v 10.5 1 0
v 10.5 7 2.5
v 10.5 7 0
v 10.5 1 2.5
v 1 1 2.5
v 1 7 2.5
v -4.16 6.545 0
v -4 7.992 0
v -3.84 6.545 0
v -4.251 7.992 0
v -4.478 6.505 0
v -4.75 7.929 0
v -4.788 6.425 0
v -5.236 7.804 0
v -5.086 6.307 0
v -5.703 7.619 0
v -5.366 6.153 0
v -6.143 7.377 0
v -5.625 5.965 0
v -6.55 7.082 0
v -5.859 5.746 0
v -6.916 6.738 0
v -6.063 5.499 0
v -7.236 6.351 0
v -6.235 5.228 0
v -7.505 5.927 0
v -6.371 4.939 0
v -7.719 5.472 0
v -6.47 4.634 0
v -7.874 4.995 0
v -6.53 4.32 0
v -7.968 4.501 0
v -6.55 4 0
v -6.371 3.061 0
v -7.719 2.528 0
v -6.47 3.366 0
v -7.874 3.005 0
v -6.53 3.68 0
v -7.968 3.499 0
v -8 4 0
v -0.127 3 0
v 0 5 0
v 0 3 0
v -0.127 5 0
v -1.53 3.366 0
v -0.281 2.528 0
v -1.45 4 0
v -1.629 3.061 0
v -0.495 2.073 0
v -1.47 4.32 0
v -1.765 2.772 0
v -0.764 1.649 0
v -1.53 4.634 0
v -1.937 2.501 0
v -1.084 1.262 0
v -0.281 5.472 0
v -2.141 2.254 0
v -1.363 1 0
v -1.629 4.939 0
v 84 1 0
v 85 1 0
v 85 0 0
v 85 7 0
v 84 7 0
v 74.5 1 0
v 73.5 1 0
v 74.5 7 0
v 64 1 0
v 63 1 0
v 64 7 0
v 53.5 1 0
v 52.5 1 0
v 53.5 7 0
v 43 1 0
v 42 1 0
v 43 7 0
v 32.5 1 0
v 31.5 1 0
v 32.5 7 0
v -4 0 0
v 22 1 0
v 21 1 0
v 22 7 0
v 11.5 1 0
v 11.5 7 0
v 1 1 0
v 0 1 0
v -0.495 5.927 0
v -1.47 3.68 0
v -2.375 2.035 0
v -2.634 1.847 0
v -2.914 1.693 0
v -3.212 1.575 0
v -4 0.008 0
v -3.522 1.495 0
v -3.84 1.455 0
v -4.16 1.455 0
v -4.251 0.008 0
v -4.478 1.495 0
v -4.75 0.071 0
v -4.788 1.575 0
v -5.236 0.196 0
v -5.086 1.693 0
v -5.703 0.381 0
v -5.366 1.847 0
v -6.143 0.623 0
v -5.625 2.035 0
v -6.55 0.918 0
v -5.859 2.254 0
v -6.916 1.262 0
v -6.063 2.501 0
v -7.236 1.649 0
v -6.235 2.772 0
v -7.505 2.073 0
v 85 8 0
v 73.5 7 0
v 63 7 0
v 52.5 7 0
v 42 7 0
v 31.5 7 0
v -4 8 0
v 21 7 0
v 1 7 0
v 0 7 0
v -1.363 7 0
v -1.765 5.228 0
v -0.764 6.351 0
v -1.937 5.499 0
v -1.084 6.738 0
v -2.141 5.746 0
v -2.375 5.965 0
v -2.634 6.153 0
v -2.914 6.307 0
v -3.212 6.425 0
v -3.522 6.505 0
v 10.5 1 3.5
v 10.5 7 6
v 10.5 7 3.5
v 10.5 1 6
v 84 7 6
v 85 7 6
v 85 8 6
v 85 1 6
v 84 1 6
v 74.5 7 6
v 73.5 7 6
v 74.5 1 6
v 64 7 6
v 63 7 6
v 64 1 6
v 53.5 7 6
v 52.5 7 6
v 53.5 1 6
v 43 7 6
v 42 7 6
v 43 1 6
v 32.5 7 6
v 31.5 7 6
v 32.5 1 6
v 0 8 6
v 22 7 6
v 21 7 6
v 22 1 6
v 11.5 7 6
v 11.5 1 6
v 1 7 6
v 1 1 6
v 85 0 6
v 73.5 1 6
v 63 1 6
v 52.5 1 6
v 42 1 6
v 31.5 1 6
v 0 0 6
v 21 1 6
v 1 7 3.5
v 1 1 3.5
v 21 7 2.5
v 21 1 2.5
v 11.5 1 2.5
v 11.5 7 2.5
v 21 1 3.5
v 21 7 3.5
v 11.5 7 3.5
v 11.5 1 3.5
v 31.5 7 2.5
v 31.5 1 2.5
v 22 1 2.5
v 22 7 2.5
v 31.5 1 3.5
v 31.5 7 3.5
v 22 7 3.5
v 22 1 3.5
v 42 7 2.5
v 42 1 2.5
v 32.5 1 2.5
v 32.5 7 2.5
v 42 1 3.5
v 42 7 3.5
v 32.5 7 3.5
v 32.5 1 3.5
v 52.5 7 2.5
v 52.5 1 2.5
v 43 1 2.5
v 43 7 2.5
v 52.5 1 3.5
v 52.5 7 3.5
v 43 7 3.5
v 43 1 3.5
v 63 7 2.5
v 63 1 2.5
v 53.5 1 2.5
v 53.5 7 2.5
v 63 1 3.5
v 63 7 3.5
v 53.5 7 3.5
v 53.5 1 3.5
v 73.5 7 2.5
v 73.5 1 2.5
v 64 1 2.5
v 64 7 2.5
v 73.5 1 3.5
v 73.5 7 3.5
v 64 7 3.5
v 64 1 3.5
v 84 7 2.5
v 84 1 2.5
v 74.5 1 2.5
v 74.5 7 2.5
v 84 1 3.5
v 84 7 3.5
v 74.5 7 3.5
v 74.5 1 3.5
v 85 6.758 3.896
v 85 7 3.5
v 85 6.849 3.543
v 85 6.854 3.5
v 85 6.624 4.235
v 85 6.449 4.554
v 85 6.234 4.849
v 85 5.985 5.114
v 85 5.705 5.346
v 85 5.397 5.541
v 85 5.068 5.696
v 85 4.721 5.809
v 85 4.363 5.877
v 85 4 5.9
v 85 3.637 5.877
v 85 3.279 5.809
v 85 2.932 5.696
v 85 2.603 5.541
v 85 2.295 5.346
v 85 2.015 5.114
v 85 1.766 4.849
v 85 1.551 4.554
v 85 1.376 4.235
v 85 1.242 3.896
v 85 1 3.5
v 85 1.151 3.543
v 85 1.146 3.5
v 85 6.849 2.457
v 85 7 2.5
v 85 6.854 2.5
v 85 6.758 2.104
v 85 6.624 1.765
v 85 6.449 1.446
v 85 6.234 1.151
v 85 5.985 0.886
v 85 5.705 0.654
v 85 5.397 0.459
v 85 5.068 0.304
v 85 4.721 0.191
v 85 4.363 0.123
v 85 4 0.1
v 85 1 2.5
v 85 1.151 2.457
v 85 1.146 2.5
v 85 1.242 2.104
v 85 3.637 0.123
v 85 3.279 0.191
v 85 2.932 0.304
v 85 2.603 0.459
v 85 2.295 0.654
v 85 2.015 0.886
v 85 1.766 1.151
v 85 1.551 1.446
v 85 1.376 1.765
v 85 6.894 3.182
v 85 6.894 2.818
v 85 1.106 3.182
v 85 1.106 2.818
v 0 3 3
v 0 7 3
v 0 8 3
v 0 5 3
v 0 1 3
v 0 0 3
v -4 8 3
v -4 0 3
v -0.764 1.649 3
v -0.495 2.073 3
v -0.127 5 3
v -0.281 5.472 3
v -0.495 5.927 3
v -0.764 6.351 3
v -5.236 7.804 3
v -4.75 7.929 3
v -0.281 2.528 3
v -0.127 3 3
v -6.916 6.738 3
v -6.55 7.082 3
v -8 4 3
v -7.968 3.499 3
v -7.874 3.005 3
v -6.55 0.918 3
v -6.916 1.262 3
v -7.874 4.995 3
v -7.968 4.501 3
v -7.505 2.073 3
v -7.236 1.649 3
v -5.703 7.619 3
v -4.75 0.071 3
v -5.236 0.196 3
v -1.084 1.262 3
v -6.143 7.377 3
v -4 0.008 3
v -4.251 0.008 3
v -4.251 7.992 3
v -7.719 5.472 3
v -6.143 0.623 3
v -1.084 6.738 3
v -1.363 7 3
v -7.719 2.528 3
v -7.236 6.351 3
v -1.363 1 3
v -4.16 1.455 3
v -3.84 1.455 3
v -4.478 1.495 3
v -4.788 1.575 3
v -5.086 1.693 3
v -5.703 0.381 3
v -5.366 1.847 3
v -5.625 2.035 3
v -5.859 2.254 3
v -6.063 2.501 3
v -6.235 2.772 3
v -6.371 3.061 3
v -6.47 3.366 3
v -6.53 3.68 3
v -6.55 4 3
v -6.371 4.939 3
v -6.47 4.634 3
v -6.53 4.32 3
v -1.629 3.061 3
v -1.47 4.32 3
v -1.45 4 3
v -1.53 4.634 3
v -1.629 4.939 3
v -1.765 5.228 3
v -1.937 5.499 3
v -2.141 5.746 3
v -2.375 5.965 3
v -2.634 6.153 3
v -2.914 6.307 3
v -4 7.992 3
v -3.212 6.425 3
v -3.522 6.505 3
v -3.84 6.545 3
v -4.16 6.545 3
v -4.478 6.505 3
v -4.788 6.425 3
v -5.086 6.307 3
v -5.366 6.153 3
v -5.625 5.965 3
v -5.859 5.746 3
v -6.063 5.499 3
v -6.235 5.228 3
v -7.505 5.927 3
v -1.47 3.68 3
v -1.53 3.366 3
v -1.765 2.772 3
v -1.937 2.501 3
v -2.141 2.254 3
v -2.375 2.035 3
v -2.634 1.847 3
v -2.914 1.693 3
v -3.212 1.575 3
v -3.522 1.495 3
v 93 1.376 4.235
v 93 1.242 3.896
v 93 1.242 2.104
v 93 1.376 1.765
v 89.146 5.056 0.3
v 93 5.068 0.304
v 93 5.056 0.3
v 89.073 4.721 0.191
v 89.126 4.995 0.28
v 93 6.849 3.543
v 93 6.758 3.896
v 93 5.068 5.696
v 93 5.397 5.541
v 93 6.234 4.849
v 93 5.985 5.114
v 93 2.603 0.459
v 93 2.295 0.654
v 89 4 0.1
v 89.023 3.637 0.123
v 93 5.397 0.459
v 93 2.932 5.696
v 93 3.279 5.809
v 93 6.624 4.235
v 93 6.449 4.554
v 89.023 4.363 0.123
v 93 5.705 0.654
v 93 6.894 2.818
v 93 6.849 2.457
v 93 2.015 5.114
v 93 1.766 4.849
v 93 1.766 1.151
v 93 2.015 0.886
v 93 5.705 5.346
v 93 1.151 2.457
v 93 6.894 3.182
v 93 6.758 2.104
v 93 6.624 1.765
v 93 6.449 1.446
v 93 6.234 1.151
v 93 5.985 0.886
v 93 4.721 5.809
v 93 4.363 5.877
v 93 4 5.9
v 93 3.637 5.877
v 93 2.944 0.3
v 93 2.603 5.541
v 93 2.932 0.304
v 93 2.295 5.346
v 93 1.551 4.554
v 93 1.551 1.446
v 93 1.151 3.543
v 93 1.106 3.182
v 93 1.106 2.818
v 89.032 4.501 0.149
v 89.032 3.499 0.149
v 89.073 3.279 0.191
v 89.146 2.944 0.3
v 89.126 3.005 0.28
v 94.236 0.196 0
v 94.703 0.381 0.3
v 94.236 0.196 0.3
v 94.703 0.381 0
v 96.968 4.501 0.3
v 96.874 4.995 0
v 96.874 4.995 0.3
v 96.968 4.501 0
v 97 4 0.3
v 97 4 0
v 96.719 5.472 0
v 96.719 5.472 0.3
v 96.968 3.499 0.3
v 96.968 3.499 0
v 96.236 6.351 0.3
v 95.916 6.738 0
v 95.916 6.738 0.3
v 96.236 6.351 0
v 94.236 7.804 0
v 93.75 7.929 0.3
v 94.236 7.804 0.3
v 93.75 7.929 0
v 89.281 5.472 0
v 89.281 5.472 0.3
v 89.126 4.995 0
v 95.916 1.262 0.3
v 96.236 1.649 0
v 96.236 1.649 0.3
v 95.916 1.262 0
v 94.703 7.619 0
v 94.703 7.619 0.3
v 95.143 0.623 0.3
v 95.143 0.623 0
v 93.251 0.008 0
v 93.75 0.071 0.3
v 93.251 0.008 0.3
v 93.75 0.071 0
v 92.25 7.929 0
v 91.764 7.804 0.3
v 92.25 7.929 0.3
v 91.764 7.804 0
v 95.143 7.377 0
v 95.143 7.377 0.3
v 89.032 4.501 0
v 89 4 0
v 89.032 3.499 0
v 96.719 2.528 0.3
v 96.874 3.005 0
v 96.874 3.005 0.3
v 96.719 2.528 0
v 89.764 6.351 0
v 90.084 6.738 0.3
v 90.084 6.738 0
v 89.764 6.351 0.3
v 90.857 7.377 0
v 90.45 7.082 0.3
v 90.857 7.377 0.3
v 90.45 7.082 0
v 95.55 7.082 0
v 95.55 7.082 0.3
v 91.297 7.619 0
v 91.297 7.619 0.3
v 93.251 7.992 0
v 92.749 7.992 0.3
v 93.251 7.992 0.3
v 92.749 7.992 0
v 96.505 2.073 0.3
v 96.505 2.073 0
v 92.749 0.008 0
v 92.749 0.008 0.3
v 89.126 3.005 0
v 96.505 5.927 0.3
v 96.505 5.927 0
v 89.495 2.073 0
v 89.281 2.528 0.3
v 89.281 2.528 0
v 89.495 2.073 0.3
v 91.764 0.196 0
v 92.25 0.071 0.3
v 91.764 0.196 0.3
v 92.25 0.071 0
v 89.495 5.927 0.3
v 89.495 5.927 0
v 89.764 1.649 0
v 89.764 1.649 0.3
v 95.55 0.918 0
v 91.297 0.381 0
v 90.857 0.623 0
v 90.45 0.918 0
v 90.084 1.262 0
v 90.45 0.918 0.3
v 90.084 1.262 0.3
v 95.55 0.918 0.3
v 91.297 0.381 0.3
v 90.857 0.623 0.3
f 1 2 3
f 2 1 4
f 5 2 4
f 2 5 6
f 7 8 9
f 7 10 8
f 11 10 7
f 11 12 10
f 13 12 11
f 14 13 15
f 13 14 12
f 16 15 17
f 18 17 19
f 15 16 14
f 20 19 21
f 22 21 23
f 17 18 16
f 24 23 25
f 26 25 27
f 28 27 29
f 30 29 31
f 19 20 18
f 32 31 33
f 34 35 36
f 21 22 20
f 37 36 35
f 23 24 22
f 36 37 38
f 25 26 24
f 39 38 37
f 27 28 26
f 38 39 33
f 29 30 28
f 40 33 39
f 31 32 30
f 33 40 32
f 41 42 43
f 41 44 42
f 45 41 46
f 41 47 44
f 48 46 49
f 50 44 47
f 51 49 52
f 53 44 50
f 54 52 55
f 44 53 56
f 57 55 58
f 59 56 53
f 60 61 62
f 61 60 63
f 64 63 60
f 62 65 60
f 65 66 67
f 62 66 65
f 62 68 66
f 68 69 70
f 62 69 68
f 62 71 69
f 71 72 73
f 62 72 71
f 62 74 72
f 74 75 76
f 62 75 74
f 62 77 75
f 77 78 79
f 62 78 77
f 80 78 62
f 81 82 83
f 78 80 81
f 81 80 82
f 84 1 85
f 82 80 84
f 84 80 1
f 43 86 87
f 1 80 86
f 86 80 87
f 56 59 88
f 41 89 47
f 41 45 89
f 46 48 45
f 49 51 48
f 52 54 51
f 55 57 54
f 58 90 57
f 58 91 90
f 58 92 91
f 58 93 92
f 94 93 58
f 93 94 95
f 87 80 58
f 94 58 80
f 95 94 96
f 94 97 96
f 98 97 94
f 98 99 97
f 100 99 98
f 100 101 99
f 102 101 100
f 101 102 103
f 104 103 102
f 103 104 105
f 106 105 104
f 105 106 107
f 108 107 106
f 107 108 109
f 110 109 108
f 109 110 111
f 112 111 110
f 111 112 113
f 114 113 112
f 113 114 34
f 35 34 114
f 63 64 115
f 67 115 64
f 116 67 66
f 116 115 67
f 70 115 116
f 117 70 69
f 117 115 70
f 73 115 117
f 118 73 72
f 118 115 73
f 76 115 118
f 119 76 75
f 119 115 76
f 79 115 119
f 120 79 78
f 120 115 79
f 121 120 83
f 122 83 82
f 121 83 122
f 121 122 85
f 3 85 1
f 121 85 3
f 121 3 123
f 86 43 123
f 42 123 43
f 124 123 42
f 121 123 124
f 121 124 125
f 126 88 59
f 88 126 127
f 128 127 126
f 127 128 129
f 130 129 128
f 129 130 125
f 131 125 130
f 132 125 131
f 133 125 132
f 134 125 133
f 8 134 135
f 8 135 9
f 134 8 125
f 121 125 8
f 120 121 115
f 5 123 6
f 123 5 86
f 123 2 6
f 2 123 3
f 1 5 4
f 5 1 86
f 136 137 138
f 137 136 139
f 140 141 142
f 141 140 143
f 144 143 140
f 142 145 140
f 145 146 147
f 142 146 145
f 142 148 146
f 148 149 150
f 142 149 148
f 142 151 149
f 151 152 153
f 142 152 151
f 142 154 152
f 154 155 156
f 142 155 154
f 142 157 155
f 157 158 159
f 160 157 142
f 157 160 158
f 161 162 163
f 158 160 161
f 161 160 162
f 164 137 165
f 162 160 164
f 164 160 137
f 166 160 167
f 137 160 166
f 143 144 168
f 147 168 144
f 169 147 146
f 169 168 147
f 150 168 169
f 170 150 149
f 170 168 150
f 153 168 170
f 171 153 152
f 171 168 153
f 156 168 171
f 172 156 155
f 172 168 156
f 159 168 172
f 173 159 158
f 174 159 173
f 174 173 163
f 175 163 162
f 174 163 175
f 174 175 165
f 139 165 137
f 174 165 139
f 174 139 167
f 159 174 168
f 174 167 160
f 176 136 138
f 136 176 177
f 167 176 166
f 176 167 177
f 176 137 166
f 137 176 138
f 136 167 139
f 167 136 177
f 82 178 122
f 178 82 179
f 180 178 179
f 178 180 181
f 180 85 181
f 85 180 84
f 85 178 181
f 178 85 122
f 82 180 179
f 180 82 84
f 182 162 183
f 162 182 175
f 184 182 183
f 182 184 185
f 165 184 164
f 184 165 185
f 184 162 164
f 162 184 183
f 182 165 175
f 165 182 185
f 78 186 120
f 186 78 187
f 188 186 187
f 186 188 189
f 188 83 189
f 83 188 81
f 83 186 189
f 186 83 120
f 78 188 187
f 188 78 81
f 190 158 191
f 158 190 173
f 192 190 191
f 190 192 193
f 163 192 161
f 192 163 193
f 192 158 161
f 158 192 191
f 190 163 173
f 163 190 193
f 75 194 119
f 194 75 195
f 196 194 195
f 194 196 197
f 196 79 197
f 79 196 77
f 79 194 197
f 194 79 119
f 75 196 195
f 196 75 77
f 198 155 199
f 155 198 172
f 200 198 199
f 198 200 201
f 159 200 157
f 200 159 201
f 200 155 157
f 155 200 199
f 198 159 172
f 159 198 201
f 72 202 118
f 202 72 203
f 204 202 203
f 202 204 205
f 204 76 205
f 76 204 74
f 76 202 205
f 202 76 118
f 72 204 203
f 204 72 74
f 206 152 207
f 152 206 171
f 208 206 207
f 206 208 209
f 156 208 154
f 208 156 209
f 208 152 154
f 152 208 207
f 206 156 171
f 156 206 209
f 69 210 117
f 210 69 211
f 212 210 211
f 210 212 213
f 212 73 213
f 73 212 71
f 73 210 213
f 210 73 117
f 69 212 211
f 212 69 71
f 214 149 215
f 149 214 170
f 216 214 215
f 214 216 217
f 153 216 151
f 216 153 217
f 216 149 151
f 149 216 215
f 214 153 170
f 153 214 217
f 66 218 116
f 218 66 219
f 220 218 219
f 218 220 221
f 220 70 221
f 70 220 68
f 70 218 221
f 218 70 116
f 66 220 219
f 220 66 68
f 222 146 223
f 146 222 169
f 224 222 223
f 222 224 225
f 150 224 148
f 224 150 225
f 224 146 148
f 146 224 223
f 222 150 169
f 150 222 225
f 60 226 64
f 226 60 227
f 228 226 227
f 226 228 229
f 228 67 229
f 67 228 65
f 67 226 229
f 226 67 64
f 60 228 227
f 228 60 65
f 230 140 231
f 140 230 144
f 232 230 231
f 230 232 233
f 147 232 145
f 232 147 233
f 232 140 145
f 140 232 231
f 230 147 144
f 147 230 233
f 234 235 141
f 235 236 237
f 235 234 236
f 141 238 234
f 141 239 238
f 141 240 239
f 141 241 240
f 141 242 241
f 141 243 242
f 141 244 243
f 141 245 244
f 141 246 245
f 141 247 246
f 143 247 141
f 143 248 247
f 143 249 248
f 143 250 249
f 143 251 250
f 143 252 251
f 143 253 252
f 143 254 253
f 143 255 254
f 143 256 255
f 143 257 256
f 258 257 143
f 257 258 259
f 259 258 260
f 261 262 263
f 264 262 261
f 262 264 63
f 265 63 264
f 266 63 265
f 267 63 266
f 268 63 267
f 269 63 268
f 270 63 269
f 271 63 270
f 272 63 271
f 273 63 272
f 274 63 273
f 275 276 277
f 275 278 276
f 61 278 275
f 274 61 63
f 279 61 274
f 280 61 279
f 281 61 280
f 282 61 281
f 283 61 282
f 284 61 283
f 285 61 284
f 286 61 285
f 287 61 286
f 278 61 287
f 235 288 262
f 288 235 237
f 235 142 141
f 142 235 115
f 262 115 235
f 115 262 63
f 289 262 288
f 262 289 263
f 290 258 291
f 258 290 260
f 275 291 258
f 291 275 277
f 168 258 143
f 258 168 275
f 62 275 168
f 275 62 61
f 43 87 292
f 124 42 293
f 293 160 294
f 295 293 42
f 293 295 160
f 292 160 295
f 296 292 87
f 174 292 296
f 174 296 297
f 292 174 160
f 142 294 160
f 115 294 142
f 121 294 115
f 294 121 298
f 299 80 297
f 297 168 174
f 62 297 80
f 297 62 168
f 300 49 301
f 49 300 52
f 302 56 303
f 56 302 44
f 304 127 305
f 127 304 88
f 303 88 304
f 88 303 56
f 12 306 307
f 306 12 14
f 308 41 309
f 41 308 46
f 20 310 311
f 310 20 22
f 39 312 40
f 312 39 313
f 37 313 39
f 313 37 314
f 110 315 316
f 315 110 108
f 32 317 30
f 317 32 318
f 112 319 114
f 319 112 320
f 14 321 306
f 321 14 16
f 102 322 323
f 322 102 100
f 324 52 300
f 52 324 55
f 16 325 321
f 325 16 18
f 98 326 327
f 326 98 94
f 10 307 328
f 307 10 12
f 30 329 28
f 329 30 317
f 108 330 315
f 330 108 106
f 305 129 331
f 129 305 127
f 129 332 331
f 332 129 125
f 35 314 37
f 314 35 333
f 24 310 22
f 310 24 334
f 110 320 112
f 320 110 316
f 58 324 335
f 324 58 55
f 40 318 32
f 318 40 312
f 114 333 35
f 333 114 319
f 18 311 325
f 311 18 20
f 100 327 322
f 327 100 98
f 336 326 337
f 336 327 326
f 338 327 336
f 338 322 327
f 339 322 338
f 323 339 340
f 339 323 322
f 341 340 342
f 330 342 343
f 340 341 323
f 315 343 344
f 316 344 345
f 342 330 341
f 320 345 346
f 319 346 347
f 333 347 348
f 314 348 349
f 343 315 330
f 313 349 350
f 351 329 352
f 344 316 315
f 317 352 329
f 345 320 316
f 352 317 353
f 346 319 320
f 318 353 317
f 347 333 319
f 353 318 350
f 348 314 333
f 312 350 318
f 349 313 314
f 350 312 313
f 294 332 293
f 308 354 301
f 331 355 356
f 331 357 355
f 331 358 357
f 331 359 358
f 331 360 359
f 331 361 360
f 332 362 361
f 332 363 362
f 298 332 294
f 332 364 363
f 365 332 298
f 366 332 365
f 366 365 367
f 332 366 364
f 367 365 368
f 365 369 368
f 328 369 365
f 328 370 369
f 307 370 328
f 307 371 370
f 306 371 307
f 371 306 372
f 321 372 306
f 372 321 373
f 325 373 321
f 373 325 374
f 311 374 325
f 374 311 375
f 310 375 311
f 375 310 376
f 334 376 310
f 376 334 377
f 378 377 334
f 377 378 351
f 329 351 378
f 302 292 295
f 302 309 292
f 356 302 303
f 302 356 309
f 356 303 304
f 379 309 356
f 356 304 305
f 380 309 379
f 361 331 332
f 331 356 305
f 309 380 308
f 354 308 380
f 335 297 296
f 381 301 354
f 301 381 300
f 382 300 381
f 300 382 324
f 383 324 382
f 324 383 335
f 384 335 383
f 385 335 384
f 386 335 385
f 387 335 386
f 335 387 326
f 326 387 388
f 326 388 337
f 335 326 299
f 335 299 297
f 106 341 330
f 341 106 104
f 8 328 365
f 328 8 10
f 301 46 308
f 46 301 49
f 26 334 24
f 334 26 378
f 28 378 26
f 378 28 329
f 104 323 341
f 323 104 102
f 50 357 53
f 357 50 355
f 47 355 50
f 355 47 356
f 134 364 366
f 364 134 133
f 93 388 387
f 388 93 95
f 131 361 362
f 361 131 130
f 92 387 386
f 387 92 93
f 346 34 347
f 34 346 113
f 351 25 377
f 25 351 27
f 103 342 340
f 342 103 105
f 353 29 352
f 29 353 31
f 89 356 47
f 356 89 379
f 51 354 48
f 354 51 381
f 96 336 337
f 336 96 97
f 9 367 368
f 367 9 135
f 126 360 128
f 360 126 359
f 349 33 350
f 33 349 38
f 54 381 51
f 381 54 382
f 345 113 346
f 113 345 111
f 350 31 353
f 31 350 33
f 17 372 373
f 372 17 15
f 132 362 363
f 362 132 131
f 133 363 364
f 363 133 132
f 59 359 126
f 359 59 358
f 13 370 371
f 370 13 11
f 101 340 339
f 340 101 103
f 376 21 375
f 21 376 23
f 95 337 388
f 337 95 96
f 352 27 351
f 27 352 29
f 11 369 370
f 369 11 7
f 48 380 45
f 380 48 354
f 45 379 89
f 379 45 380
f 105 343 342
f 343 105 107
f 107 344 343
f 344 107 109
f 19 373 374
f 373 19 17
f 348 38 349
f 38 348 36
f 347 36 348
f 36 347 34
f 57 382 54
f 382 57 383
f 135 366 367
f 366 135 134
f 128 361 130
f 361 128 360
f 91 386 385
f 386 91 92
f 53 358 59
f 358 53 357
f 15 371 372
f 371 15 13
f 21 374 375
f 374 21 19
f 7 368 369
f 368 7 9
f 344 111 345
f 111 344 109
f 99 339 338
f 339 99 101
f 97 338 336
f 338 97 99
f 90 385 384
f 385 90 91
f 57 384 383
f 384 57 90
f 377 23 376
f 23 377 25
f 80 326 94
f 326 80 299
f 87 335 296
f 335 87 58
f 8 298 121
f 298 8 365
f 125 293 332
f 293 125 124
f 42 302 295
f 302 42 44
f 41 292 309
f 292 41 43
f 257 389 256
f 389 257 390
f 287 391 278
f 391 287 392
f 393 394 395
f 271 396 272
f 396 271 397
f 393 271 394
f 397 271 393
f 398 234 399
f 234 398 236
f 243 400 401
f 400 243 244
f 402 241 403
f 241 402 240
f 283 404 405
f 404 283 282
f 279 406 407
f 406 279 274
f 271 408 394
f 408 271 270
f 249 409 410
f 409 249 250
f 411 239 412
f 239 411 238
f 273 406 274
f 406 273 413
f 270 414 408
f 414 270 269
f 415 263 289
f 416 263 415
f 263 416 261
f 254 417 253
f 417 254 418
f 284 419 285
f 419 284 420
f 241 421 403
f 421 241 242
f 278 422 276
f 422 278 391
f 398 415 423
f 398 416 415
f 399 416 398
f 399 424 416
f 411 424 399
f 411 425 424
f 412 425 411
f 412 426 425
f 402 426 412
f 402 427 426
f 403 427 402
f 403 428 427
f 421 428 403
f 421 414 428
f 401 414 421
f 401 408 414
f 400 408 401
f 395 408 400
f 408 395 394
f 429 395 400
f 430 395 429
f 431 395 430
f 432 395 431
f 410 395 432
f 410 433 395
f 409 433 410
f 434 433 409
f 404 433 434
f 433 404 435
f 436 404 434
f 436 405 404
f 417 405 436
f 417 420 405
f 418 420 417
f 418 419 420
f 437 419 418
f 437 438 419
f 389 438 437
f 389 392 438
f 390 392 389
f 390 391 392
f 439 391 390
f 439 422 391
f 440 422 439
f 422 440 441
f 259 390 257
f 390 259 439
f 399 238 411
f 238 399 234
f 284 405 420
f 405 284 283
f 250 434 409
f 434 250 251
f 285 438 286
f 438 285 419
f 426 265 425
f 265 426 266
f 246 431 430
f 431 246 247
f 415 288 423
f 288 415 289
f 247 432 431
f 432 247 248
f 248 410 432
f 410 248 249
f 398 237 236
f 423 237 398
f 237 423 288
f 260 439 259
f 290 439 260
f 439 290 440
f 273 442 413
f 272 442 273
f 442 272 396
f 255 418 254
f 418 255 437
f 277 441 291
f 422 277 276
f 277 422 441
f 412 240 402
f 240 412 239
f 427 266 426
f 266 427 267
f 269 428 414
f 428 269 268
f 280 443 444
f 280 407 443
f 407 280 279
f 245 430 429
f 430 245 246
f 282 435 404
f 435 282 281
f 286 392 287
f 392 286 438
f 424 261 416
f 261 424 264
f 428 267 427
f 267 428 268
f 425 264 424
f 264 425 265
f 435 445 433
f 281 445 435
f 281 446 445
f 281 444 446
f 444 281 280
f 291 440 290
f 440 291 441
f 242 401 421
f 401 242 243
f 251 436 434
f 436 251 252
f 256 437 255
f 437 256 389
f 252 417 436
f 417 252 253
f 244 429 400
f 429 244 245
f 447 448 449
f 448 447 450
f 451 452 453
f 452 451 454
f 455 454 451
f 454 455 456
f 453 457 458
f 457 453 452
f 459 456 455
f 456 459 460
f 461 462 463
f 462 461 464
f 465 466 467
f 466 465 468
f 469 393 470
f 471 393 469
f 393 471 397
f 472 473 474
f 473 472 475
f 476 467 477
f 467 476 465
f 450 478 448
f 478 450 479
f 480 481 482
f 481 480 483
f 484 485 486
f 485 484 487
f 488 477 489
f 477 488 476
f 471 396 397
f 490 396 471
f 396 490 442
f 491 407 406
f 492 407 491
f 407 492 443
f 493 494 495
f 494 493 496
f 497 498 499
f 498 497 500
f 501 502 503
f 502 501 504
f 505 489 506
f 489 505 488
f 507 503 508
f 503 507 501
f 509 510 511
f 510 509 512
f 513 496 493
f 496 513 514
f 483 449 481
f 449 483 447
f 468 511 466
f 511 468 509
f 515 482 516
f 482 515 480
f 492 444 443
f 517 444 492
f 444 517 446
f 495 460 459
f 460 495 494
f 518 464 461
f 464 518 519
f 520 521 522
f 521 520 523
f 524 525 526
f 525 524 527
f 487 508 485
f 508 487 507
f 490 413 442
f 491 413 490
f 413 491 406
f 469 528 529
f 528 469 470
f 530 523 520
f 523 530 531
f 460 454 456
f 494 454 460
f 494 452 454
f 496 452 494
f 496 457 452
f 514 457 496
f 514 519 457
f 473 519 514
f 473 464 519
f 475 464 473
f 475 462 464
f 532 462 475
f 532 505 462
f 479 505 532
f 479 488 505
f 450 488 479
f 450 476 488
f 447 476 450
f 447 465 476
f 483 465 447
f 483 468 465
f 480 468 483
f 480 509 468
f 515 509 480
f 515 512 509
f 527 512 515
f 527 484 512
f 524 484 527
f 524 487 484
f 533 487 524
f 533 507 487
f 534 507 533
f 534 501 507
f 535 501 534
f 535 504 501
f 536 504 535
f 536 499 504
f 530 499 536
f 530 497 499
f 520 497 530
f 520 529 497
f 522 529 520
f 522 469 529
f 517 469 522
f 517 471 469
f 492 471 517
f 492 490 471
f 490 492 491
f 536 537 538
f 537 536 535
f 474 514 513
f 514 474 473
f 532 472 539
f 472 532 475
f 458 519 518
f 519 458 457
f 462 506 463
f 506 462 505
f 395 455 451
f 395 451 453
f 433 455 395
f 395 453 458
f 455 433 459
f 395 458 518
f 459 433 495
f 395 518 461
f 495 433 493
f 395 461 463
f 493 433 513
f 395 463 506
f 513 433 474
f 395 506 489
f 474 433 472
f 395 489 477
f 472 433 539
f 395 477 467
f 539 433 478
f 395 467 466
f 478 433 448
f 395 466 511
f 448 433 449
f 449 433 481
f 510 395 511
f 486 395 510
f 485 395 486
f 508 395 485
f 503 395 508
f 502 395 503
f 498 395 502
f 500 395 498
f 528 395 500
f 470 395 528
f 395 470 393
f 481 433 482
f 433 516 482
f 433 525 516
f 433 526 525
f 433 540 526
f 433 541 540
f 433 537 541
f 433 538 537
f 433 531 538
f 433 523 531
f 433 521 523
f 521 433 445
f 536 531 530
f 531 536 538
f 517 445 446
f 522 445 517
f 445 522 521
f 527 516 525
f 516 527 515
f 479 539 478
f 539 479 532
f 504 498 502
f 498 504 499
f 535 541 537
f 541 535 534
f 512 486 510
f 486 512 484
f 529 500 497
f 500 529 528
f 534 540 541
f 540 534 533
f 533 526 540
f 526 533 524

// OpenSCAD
$fn=50;

length_cells = 8;
clearance = 0.05;

difference(){
    cube([1+(9.5+1)*length_cells,8,6]);
    
    for (c=[0:length_cells]) {
        translate([1+(9.5+1)*c,1,0])
        cube([9.5, 6, 2.5]);
        
        translate([1+(9.5+1)*c,1,3.5])
        cube([9.5, 6, 2.5]);
    }
}
translate([-4,0,0])
cube([4,1,3]);

translate([-4,7,0])
cube([4,1,3]);

translate([-1,3,0])
cube([1,2,3]);

translate([-4,4,0])
difference(){
    cylinder(3, 4, 4);
    cylinder(3, 2.5+clearance, 2.5+clearance);
    //translate([-4,0,0]) cube([2,0.2,4]);
}

translate([1+(9.5+1)*length_cells,4,3])
rotate([0,90,0])
cylinder(8, 5.8/2, 5.8/2);

translate([1+(9.5+1)*length_cells+8,4,0])
cylinder(0.3, 4, 4);
